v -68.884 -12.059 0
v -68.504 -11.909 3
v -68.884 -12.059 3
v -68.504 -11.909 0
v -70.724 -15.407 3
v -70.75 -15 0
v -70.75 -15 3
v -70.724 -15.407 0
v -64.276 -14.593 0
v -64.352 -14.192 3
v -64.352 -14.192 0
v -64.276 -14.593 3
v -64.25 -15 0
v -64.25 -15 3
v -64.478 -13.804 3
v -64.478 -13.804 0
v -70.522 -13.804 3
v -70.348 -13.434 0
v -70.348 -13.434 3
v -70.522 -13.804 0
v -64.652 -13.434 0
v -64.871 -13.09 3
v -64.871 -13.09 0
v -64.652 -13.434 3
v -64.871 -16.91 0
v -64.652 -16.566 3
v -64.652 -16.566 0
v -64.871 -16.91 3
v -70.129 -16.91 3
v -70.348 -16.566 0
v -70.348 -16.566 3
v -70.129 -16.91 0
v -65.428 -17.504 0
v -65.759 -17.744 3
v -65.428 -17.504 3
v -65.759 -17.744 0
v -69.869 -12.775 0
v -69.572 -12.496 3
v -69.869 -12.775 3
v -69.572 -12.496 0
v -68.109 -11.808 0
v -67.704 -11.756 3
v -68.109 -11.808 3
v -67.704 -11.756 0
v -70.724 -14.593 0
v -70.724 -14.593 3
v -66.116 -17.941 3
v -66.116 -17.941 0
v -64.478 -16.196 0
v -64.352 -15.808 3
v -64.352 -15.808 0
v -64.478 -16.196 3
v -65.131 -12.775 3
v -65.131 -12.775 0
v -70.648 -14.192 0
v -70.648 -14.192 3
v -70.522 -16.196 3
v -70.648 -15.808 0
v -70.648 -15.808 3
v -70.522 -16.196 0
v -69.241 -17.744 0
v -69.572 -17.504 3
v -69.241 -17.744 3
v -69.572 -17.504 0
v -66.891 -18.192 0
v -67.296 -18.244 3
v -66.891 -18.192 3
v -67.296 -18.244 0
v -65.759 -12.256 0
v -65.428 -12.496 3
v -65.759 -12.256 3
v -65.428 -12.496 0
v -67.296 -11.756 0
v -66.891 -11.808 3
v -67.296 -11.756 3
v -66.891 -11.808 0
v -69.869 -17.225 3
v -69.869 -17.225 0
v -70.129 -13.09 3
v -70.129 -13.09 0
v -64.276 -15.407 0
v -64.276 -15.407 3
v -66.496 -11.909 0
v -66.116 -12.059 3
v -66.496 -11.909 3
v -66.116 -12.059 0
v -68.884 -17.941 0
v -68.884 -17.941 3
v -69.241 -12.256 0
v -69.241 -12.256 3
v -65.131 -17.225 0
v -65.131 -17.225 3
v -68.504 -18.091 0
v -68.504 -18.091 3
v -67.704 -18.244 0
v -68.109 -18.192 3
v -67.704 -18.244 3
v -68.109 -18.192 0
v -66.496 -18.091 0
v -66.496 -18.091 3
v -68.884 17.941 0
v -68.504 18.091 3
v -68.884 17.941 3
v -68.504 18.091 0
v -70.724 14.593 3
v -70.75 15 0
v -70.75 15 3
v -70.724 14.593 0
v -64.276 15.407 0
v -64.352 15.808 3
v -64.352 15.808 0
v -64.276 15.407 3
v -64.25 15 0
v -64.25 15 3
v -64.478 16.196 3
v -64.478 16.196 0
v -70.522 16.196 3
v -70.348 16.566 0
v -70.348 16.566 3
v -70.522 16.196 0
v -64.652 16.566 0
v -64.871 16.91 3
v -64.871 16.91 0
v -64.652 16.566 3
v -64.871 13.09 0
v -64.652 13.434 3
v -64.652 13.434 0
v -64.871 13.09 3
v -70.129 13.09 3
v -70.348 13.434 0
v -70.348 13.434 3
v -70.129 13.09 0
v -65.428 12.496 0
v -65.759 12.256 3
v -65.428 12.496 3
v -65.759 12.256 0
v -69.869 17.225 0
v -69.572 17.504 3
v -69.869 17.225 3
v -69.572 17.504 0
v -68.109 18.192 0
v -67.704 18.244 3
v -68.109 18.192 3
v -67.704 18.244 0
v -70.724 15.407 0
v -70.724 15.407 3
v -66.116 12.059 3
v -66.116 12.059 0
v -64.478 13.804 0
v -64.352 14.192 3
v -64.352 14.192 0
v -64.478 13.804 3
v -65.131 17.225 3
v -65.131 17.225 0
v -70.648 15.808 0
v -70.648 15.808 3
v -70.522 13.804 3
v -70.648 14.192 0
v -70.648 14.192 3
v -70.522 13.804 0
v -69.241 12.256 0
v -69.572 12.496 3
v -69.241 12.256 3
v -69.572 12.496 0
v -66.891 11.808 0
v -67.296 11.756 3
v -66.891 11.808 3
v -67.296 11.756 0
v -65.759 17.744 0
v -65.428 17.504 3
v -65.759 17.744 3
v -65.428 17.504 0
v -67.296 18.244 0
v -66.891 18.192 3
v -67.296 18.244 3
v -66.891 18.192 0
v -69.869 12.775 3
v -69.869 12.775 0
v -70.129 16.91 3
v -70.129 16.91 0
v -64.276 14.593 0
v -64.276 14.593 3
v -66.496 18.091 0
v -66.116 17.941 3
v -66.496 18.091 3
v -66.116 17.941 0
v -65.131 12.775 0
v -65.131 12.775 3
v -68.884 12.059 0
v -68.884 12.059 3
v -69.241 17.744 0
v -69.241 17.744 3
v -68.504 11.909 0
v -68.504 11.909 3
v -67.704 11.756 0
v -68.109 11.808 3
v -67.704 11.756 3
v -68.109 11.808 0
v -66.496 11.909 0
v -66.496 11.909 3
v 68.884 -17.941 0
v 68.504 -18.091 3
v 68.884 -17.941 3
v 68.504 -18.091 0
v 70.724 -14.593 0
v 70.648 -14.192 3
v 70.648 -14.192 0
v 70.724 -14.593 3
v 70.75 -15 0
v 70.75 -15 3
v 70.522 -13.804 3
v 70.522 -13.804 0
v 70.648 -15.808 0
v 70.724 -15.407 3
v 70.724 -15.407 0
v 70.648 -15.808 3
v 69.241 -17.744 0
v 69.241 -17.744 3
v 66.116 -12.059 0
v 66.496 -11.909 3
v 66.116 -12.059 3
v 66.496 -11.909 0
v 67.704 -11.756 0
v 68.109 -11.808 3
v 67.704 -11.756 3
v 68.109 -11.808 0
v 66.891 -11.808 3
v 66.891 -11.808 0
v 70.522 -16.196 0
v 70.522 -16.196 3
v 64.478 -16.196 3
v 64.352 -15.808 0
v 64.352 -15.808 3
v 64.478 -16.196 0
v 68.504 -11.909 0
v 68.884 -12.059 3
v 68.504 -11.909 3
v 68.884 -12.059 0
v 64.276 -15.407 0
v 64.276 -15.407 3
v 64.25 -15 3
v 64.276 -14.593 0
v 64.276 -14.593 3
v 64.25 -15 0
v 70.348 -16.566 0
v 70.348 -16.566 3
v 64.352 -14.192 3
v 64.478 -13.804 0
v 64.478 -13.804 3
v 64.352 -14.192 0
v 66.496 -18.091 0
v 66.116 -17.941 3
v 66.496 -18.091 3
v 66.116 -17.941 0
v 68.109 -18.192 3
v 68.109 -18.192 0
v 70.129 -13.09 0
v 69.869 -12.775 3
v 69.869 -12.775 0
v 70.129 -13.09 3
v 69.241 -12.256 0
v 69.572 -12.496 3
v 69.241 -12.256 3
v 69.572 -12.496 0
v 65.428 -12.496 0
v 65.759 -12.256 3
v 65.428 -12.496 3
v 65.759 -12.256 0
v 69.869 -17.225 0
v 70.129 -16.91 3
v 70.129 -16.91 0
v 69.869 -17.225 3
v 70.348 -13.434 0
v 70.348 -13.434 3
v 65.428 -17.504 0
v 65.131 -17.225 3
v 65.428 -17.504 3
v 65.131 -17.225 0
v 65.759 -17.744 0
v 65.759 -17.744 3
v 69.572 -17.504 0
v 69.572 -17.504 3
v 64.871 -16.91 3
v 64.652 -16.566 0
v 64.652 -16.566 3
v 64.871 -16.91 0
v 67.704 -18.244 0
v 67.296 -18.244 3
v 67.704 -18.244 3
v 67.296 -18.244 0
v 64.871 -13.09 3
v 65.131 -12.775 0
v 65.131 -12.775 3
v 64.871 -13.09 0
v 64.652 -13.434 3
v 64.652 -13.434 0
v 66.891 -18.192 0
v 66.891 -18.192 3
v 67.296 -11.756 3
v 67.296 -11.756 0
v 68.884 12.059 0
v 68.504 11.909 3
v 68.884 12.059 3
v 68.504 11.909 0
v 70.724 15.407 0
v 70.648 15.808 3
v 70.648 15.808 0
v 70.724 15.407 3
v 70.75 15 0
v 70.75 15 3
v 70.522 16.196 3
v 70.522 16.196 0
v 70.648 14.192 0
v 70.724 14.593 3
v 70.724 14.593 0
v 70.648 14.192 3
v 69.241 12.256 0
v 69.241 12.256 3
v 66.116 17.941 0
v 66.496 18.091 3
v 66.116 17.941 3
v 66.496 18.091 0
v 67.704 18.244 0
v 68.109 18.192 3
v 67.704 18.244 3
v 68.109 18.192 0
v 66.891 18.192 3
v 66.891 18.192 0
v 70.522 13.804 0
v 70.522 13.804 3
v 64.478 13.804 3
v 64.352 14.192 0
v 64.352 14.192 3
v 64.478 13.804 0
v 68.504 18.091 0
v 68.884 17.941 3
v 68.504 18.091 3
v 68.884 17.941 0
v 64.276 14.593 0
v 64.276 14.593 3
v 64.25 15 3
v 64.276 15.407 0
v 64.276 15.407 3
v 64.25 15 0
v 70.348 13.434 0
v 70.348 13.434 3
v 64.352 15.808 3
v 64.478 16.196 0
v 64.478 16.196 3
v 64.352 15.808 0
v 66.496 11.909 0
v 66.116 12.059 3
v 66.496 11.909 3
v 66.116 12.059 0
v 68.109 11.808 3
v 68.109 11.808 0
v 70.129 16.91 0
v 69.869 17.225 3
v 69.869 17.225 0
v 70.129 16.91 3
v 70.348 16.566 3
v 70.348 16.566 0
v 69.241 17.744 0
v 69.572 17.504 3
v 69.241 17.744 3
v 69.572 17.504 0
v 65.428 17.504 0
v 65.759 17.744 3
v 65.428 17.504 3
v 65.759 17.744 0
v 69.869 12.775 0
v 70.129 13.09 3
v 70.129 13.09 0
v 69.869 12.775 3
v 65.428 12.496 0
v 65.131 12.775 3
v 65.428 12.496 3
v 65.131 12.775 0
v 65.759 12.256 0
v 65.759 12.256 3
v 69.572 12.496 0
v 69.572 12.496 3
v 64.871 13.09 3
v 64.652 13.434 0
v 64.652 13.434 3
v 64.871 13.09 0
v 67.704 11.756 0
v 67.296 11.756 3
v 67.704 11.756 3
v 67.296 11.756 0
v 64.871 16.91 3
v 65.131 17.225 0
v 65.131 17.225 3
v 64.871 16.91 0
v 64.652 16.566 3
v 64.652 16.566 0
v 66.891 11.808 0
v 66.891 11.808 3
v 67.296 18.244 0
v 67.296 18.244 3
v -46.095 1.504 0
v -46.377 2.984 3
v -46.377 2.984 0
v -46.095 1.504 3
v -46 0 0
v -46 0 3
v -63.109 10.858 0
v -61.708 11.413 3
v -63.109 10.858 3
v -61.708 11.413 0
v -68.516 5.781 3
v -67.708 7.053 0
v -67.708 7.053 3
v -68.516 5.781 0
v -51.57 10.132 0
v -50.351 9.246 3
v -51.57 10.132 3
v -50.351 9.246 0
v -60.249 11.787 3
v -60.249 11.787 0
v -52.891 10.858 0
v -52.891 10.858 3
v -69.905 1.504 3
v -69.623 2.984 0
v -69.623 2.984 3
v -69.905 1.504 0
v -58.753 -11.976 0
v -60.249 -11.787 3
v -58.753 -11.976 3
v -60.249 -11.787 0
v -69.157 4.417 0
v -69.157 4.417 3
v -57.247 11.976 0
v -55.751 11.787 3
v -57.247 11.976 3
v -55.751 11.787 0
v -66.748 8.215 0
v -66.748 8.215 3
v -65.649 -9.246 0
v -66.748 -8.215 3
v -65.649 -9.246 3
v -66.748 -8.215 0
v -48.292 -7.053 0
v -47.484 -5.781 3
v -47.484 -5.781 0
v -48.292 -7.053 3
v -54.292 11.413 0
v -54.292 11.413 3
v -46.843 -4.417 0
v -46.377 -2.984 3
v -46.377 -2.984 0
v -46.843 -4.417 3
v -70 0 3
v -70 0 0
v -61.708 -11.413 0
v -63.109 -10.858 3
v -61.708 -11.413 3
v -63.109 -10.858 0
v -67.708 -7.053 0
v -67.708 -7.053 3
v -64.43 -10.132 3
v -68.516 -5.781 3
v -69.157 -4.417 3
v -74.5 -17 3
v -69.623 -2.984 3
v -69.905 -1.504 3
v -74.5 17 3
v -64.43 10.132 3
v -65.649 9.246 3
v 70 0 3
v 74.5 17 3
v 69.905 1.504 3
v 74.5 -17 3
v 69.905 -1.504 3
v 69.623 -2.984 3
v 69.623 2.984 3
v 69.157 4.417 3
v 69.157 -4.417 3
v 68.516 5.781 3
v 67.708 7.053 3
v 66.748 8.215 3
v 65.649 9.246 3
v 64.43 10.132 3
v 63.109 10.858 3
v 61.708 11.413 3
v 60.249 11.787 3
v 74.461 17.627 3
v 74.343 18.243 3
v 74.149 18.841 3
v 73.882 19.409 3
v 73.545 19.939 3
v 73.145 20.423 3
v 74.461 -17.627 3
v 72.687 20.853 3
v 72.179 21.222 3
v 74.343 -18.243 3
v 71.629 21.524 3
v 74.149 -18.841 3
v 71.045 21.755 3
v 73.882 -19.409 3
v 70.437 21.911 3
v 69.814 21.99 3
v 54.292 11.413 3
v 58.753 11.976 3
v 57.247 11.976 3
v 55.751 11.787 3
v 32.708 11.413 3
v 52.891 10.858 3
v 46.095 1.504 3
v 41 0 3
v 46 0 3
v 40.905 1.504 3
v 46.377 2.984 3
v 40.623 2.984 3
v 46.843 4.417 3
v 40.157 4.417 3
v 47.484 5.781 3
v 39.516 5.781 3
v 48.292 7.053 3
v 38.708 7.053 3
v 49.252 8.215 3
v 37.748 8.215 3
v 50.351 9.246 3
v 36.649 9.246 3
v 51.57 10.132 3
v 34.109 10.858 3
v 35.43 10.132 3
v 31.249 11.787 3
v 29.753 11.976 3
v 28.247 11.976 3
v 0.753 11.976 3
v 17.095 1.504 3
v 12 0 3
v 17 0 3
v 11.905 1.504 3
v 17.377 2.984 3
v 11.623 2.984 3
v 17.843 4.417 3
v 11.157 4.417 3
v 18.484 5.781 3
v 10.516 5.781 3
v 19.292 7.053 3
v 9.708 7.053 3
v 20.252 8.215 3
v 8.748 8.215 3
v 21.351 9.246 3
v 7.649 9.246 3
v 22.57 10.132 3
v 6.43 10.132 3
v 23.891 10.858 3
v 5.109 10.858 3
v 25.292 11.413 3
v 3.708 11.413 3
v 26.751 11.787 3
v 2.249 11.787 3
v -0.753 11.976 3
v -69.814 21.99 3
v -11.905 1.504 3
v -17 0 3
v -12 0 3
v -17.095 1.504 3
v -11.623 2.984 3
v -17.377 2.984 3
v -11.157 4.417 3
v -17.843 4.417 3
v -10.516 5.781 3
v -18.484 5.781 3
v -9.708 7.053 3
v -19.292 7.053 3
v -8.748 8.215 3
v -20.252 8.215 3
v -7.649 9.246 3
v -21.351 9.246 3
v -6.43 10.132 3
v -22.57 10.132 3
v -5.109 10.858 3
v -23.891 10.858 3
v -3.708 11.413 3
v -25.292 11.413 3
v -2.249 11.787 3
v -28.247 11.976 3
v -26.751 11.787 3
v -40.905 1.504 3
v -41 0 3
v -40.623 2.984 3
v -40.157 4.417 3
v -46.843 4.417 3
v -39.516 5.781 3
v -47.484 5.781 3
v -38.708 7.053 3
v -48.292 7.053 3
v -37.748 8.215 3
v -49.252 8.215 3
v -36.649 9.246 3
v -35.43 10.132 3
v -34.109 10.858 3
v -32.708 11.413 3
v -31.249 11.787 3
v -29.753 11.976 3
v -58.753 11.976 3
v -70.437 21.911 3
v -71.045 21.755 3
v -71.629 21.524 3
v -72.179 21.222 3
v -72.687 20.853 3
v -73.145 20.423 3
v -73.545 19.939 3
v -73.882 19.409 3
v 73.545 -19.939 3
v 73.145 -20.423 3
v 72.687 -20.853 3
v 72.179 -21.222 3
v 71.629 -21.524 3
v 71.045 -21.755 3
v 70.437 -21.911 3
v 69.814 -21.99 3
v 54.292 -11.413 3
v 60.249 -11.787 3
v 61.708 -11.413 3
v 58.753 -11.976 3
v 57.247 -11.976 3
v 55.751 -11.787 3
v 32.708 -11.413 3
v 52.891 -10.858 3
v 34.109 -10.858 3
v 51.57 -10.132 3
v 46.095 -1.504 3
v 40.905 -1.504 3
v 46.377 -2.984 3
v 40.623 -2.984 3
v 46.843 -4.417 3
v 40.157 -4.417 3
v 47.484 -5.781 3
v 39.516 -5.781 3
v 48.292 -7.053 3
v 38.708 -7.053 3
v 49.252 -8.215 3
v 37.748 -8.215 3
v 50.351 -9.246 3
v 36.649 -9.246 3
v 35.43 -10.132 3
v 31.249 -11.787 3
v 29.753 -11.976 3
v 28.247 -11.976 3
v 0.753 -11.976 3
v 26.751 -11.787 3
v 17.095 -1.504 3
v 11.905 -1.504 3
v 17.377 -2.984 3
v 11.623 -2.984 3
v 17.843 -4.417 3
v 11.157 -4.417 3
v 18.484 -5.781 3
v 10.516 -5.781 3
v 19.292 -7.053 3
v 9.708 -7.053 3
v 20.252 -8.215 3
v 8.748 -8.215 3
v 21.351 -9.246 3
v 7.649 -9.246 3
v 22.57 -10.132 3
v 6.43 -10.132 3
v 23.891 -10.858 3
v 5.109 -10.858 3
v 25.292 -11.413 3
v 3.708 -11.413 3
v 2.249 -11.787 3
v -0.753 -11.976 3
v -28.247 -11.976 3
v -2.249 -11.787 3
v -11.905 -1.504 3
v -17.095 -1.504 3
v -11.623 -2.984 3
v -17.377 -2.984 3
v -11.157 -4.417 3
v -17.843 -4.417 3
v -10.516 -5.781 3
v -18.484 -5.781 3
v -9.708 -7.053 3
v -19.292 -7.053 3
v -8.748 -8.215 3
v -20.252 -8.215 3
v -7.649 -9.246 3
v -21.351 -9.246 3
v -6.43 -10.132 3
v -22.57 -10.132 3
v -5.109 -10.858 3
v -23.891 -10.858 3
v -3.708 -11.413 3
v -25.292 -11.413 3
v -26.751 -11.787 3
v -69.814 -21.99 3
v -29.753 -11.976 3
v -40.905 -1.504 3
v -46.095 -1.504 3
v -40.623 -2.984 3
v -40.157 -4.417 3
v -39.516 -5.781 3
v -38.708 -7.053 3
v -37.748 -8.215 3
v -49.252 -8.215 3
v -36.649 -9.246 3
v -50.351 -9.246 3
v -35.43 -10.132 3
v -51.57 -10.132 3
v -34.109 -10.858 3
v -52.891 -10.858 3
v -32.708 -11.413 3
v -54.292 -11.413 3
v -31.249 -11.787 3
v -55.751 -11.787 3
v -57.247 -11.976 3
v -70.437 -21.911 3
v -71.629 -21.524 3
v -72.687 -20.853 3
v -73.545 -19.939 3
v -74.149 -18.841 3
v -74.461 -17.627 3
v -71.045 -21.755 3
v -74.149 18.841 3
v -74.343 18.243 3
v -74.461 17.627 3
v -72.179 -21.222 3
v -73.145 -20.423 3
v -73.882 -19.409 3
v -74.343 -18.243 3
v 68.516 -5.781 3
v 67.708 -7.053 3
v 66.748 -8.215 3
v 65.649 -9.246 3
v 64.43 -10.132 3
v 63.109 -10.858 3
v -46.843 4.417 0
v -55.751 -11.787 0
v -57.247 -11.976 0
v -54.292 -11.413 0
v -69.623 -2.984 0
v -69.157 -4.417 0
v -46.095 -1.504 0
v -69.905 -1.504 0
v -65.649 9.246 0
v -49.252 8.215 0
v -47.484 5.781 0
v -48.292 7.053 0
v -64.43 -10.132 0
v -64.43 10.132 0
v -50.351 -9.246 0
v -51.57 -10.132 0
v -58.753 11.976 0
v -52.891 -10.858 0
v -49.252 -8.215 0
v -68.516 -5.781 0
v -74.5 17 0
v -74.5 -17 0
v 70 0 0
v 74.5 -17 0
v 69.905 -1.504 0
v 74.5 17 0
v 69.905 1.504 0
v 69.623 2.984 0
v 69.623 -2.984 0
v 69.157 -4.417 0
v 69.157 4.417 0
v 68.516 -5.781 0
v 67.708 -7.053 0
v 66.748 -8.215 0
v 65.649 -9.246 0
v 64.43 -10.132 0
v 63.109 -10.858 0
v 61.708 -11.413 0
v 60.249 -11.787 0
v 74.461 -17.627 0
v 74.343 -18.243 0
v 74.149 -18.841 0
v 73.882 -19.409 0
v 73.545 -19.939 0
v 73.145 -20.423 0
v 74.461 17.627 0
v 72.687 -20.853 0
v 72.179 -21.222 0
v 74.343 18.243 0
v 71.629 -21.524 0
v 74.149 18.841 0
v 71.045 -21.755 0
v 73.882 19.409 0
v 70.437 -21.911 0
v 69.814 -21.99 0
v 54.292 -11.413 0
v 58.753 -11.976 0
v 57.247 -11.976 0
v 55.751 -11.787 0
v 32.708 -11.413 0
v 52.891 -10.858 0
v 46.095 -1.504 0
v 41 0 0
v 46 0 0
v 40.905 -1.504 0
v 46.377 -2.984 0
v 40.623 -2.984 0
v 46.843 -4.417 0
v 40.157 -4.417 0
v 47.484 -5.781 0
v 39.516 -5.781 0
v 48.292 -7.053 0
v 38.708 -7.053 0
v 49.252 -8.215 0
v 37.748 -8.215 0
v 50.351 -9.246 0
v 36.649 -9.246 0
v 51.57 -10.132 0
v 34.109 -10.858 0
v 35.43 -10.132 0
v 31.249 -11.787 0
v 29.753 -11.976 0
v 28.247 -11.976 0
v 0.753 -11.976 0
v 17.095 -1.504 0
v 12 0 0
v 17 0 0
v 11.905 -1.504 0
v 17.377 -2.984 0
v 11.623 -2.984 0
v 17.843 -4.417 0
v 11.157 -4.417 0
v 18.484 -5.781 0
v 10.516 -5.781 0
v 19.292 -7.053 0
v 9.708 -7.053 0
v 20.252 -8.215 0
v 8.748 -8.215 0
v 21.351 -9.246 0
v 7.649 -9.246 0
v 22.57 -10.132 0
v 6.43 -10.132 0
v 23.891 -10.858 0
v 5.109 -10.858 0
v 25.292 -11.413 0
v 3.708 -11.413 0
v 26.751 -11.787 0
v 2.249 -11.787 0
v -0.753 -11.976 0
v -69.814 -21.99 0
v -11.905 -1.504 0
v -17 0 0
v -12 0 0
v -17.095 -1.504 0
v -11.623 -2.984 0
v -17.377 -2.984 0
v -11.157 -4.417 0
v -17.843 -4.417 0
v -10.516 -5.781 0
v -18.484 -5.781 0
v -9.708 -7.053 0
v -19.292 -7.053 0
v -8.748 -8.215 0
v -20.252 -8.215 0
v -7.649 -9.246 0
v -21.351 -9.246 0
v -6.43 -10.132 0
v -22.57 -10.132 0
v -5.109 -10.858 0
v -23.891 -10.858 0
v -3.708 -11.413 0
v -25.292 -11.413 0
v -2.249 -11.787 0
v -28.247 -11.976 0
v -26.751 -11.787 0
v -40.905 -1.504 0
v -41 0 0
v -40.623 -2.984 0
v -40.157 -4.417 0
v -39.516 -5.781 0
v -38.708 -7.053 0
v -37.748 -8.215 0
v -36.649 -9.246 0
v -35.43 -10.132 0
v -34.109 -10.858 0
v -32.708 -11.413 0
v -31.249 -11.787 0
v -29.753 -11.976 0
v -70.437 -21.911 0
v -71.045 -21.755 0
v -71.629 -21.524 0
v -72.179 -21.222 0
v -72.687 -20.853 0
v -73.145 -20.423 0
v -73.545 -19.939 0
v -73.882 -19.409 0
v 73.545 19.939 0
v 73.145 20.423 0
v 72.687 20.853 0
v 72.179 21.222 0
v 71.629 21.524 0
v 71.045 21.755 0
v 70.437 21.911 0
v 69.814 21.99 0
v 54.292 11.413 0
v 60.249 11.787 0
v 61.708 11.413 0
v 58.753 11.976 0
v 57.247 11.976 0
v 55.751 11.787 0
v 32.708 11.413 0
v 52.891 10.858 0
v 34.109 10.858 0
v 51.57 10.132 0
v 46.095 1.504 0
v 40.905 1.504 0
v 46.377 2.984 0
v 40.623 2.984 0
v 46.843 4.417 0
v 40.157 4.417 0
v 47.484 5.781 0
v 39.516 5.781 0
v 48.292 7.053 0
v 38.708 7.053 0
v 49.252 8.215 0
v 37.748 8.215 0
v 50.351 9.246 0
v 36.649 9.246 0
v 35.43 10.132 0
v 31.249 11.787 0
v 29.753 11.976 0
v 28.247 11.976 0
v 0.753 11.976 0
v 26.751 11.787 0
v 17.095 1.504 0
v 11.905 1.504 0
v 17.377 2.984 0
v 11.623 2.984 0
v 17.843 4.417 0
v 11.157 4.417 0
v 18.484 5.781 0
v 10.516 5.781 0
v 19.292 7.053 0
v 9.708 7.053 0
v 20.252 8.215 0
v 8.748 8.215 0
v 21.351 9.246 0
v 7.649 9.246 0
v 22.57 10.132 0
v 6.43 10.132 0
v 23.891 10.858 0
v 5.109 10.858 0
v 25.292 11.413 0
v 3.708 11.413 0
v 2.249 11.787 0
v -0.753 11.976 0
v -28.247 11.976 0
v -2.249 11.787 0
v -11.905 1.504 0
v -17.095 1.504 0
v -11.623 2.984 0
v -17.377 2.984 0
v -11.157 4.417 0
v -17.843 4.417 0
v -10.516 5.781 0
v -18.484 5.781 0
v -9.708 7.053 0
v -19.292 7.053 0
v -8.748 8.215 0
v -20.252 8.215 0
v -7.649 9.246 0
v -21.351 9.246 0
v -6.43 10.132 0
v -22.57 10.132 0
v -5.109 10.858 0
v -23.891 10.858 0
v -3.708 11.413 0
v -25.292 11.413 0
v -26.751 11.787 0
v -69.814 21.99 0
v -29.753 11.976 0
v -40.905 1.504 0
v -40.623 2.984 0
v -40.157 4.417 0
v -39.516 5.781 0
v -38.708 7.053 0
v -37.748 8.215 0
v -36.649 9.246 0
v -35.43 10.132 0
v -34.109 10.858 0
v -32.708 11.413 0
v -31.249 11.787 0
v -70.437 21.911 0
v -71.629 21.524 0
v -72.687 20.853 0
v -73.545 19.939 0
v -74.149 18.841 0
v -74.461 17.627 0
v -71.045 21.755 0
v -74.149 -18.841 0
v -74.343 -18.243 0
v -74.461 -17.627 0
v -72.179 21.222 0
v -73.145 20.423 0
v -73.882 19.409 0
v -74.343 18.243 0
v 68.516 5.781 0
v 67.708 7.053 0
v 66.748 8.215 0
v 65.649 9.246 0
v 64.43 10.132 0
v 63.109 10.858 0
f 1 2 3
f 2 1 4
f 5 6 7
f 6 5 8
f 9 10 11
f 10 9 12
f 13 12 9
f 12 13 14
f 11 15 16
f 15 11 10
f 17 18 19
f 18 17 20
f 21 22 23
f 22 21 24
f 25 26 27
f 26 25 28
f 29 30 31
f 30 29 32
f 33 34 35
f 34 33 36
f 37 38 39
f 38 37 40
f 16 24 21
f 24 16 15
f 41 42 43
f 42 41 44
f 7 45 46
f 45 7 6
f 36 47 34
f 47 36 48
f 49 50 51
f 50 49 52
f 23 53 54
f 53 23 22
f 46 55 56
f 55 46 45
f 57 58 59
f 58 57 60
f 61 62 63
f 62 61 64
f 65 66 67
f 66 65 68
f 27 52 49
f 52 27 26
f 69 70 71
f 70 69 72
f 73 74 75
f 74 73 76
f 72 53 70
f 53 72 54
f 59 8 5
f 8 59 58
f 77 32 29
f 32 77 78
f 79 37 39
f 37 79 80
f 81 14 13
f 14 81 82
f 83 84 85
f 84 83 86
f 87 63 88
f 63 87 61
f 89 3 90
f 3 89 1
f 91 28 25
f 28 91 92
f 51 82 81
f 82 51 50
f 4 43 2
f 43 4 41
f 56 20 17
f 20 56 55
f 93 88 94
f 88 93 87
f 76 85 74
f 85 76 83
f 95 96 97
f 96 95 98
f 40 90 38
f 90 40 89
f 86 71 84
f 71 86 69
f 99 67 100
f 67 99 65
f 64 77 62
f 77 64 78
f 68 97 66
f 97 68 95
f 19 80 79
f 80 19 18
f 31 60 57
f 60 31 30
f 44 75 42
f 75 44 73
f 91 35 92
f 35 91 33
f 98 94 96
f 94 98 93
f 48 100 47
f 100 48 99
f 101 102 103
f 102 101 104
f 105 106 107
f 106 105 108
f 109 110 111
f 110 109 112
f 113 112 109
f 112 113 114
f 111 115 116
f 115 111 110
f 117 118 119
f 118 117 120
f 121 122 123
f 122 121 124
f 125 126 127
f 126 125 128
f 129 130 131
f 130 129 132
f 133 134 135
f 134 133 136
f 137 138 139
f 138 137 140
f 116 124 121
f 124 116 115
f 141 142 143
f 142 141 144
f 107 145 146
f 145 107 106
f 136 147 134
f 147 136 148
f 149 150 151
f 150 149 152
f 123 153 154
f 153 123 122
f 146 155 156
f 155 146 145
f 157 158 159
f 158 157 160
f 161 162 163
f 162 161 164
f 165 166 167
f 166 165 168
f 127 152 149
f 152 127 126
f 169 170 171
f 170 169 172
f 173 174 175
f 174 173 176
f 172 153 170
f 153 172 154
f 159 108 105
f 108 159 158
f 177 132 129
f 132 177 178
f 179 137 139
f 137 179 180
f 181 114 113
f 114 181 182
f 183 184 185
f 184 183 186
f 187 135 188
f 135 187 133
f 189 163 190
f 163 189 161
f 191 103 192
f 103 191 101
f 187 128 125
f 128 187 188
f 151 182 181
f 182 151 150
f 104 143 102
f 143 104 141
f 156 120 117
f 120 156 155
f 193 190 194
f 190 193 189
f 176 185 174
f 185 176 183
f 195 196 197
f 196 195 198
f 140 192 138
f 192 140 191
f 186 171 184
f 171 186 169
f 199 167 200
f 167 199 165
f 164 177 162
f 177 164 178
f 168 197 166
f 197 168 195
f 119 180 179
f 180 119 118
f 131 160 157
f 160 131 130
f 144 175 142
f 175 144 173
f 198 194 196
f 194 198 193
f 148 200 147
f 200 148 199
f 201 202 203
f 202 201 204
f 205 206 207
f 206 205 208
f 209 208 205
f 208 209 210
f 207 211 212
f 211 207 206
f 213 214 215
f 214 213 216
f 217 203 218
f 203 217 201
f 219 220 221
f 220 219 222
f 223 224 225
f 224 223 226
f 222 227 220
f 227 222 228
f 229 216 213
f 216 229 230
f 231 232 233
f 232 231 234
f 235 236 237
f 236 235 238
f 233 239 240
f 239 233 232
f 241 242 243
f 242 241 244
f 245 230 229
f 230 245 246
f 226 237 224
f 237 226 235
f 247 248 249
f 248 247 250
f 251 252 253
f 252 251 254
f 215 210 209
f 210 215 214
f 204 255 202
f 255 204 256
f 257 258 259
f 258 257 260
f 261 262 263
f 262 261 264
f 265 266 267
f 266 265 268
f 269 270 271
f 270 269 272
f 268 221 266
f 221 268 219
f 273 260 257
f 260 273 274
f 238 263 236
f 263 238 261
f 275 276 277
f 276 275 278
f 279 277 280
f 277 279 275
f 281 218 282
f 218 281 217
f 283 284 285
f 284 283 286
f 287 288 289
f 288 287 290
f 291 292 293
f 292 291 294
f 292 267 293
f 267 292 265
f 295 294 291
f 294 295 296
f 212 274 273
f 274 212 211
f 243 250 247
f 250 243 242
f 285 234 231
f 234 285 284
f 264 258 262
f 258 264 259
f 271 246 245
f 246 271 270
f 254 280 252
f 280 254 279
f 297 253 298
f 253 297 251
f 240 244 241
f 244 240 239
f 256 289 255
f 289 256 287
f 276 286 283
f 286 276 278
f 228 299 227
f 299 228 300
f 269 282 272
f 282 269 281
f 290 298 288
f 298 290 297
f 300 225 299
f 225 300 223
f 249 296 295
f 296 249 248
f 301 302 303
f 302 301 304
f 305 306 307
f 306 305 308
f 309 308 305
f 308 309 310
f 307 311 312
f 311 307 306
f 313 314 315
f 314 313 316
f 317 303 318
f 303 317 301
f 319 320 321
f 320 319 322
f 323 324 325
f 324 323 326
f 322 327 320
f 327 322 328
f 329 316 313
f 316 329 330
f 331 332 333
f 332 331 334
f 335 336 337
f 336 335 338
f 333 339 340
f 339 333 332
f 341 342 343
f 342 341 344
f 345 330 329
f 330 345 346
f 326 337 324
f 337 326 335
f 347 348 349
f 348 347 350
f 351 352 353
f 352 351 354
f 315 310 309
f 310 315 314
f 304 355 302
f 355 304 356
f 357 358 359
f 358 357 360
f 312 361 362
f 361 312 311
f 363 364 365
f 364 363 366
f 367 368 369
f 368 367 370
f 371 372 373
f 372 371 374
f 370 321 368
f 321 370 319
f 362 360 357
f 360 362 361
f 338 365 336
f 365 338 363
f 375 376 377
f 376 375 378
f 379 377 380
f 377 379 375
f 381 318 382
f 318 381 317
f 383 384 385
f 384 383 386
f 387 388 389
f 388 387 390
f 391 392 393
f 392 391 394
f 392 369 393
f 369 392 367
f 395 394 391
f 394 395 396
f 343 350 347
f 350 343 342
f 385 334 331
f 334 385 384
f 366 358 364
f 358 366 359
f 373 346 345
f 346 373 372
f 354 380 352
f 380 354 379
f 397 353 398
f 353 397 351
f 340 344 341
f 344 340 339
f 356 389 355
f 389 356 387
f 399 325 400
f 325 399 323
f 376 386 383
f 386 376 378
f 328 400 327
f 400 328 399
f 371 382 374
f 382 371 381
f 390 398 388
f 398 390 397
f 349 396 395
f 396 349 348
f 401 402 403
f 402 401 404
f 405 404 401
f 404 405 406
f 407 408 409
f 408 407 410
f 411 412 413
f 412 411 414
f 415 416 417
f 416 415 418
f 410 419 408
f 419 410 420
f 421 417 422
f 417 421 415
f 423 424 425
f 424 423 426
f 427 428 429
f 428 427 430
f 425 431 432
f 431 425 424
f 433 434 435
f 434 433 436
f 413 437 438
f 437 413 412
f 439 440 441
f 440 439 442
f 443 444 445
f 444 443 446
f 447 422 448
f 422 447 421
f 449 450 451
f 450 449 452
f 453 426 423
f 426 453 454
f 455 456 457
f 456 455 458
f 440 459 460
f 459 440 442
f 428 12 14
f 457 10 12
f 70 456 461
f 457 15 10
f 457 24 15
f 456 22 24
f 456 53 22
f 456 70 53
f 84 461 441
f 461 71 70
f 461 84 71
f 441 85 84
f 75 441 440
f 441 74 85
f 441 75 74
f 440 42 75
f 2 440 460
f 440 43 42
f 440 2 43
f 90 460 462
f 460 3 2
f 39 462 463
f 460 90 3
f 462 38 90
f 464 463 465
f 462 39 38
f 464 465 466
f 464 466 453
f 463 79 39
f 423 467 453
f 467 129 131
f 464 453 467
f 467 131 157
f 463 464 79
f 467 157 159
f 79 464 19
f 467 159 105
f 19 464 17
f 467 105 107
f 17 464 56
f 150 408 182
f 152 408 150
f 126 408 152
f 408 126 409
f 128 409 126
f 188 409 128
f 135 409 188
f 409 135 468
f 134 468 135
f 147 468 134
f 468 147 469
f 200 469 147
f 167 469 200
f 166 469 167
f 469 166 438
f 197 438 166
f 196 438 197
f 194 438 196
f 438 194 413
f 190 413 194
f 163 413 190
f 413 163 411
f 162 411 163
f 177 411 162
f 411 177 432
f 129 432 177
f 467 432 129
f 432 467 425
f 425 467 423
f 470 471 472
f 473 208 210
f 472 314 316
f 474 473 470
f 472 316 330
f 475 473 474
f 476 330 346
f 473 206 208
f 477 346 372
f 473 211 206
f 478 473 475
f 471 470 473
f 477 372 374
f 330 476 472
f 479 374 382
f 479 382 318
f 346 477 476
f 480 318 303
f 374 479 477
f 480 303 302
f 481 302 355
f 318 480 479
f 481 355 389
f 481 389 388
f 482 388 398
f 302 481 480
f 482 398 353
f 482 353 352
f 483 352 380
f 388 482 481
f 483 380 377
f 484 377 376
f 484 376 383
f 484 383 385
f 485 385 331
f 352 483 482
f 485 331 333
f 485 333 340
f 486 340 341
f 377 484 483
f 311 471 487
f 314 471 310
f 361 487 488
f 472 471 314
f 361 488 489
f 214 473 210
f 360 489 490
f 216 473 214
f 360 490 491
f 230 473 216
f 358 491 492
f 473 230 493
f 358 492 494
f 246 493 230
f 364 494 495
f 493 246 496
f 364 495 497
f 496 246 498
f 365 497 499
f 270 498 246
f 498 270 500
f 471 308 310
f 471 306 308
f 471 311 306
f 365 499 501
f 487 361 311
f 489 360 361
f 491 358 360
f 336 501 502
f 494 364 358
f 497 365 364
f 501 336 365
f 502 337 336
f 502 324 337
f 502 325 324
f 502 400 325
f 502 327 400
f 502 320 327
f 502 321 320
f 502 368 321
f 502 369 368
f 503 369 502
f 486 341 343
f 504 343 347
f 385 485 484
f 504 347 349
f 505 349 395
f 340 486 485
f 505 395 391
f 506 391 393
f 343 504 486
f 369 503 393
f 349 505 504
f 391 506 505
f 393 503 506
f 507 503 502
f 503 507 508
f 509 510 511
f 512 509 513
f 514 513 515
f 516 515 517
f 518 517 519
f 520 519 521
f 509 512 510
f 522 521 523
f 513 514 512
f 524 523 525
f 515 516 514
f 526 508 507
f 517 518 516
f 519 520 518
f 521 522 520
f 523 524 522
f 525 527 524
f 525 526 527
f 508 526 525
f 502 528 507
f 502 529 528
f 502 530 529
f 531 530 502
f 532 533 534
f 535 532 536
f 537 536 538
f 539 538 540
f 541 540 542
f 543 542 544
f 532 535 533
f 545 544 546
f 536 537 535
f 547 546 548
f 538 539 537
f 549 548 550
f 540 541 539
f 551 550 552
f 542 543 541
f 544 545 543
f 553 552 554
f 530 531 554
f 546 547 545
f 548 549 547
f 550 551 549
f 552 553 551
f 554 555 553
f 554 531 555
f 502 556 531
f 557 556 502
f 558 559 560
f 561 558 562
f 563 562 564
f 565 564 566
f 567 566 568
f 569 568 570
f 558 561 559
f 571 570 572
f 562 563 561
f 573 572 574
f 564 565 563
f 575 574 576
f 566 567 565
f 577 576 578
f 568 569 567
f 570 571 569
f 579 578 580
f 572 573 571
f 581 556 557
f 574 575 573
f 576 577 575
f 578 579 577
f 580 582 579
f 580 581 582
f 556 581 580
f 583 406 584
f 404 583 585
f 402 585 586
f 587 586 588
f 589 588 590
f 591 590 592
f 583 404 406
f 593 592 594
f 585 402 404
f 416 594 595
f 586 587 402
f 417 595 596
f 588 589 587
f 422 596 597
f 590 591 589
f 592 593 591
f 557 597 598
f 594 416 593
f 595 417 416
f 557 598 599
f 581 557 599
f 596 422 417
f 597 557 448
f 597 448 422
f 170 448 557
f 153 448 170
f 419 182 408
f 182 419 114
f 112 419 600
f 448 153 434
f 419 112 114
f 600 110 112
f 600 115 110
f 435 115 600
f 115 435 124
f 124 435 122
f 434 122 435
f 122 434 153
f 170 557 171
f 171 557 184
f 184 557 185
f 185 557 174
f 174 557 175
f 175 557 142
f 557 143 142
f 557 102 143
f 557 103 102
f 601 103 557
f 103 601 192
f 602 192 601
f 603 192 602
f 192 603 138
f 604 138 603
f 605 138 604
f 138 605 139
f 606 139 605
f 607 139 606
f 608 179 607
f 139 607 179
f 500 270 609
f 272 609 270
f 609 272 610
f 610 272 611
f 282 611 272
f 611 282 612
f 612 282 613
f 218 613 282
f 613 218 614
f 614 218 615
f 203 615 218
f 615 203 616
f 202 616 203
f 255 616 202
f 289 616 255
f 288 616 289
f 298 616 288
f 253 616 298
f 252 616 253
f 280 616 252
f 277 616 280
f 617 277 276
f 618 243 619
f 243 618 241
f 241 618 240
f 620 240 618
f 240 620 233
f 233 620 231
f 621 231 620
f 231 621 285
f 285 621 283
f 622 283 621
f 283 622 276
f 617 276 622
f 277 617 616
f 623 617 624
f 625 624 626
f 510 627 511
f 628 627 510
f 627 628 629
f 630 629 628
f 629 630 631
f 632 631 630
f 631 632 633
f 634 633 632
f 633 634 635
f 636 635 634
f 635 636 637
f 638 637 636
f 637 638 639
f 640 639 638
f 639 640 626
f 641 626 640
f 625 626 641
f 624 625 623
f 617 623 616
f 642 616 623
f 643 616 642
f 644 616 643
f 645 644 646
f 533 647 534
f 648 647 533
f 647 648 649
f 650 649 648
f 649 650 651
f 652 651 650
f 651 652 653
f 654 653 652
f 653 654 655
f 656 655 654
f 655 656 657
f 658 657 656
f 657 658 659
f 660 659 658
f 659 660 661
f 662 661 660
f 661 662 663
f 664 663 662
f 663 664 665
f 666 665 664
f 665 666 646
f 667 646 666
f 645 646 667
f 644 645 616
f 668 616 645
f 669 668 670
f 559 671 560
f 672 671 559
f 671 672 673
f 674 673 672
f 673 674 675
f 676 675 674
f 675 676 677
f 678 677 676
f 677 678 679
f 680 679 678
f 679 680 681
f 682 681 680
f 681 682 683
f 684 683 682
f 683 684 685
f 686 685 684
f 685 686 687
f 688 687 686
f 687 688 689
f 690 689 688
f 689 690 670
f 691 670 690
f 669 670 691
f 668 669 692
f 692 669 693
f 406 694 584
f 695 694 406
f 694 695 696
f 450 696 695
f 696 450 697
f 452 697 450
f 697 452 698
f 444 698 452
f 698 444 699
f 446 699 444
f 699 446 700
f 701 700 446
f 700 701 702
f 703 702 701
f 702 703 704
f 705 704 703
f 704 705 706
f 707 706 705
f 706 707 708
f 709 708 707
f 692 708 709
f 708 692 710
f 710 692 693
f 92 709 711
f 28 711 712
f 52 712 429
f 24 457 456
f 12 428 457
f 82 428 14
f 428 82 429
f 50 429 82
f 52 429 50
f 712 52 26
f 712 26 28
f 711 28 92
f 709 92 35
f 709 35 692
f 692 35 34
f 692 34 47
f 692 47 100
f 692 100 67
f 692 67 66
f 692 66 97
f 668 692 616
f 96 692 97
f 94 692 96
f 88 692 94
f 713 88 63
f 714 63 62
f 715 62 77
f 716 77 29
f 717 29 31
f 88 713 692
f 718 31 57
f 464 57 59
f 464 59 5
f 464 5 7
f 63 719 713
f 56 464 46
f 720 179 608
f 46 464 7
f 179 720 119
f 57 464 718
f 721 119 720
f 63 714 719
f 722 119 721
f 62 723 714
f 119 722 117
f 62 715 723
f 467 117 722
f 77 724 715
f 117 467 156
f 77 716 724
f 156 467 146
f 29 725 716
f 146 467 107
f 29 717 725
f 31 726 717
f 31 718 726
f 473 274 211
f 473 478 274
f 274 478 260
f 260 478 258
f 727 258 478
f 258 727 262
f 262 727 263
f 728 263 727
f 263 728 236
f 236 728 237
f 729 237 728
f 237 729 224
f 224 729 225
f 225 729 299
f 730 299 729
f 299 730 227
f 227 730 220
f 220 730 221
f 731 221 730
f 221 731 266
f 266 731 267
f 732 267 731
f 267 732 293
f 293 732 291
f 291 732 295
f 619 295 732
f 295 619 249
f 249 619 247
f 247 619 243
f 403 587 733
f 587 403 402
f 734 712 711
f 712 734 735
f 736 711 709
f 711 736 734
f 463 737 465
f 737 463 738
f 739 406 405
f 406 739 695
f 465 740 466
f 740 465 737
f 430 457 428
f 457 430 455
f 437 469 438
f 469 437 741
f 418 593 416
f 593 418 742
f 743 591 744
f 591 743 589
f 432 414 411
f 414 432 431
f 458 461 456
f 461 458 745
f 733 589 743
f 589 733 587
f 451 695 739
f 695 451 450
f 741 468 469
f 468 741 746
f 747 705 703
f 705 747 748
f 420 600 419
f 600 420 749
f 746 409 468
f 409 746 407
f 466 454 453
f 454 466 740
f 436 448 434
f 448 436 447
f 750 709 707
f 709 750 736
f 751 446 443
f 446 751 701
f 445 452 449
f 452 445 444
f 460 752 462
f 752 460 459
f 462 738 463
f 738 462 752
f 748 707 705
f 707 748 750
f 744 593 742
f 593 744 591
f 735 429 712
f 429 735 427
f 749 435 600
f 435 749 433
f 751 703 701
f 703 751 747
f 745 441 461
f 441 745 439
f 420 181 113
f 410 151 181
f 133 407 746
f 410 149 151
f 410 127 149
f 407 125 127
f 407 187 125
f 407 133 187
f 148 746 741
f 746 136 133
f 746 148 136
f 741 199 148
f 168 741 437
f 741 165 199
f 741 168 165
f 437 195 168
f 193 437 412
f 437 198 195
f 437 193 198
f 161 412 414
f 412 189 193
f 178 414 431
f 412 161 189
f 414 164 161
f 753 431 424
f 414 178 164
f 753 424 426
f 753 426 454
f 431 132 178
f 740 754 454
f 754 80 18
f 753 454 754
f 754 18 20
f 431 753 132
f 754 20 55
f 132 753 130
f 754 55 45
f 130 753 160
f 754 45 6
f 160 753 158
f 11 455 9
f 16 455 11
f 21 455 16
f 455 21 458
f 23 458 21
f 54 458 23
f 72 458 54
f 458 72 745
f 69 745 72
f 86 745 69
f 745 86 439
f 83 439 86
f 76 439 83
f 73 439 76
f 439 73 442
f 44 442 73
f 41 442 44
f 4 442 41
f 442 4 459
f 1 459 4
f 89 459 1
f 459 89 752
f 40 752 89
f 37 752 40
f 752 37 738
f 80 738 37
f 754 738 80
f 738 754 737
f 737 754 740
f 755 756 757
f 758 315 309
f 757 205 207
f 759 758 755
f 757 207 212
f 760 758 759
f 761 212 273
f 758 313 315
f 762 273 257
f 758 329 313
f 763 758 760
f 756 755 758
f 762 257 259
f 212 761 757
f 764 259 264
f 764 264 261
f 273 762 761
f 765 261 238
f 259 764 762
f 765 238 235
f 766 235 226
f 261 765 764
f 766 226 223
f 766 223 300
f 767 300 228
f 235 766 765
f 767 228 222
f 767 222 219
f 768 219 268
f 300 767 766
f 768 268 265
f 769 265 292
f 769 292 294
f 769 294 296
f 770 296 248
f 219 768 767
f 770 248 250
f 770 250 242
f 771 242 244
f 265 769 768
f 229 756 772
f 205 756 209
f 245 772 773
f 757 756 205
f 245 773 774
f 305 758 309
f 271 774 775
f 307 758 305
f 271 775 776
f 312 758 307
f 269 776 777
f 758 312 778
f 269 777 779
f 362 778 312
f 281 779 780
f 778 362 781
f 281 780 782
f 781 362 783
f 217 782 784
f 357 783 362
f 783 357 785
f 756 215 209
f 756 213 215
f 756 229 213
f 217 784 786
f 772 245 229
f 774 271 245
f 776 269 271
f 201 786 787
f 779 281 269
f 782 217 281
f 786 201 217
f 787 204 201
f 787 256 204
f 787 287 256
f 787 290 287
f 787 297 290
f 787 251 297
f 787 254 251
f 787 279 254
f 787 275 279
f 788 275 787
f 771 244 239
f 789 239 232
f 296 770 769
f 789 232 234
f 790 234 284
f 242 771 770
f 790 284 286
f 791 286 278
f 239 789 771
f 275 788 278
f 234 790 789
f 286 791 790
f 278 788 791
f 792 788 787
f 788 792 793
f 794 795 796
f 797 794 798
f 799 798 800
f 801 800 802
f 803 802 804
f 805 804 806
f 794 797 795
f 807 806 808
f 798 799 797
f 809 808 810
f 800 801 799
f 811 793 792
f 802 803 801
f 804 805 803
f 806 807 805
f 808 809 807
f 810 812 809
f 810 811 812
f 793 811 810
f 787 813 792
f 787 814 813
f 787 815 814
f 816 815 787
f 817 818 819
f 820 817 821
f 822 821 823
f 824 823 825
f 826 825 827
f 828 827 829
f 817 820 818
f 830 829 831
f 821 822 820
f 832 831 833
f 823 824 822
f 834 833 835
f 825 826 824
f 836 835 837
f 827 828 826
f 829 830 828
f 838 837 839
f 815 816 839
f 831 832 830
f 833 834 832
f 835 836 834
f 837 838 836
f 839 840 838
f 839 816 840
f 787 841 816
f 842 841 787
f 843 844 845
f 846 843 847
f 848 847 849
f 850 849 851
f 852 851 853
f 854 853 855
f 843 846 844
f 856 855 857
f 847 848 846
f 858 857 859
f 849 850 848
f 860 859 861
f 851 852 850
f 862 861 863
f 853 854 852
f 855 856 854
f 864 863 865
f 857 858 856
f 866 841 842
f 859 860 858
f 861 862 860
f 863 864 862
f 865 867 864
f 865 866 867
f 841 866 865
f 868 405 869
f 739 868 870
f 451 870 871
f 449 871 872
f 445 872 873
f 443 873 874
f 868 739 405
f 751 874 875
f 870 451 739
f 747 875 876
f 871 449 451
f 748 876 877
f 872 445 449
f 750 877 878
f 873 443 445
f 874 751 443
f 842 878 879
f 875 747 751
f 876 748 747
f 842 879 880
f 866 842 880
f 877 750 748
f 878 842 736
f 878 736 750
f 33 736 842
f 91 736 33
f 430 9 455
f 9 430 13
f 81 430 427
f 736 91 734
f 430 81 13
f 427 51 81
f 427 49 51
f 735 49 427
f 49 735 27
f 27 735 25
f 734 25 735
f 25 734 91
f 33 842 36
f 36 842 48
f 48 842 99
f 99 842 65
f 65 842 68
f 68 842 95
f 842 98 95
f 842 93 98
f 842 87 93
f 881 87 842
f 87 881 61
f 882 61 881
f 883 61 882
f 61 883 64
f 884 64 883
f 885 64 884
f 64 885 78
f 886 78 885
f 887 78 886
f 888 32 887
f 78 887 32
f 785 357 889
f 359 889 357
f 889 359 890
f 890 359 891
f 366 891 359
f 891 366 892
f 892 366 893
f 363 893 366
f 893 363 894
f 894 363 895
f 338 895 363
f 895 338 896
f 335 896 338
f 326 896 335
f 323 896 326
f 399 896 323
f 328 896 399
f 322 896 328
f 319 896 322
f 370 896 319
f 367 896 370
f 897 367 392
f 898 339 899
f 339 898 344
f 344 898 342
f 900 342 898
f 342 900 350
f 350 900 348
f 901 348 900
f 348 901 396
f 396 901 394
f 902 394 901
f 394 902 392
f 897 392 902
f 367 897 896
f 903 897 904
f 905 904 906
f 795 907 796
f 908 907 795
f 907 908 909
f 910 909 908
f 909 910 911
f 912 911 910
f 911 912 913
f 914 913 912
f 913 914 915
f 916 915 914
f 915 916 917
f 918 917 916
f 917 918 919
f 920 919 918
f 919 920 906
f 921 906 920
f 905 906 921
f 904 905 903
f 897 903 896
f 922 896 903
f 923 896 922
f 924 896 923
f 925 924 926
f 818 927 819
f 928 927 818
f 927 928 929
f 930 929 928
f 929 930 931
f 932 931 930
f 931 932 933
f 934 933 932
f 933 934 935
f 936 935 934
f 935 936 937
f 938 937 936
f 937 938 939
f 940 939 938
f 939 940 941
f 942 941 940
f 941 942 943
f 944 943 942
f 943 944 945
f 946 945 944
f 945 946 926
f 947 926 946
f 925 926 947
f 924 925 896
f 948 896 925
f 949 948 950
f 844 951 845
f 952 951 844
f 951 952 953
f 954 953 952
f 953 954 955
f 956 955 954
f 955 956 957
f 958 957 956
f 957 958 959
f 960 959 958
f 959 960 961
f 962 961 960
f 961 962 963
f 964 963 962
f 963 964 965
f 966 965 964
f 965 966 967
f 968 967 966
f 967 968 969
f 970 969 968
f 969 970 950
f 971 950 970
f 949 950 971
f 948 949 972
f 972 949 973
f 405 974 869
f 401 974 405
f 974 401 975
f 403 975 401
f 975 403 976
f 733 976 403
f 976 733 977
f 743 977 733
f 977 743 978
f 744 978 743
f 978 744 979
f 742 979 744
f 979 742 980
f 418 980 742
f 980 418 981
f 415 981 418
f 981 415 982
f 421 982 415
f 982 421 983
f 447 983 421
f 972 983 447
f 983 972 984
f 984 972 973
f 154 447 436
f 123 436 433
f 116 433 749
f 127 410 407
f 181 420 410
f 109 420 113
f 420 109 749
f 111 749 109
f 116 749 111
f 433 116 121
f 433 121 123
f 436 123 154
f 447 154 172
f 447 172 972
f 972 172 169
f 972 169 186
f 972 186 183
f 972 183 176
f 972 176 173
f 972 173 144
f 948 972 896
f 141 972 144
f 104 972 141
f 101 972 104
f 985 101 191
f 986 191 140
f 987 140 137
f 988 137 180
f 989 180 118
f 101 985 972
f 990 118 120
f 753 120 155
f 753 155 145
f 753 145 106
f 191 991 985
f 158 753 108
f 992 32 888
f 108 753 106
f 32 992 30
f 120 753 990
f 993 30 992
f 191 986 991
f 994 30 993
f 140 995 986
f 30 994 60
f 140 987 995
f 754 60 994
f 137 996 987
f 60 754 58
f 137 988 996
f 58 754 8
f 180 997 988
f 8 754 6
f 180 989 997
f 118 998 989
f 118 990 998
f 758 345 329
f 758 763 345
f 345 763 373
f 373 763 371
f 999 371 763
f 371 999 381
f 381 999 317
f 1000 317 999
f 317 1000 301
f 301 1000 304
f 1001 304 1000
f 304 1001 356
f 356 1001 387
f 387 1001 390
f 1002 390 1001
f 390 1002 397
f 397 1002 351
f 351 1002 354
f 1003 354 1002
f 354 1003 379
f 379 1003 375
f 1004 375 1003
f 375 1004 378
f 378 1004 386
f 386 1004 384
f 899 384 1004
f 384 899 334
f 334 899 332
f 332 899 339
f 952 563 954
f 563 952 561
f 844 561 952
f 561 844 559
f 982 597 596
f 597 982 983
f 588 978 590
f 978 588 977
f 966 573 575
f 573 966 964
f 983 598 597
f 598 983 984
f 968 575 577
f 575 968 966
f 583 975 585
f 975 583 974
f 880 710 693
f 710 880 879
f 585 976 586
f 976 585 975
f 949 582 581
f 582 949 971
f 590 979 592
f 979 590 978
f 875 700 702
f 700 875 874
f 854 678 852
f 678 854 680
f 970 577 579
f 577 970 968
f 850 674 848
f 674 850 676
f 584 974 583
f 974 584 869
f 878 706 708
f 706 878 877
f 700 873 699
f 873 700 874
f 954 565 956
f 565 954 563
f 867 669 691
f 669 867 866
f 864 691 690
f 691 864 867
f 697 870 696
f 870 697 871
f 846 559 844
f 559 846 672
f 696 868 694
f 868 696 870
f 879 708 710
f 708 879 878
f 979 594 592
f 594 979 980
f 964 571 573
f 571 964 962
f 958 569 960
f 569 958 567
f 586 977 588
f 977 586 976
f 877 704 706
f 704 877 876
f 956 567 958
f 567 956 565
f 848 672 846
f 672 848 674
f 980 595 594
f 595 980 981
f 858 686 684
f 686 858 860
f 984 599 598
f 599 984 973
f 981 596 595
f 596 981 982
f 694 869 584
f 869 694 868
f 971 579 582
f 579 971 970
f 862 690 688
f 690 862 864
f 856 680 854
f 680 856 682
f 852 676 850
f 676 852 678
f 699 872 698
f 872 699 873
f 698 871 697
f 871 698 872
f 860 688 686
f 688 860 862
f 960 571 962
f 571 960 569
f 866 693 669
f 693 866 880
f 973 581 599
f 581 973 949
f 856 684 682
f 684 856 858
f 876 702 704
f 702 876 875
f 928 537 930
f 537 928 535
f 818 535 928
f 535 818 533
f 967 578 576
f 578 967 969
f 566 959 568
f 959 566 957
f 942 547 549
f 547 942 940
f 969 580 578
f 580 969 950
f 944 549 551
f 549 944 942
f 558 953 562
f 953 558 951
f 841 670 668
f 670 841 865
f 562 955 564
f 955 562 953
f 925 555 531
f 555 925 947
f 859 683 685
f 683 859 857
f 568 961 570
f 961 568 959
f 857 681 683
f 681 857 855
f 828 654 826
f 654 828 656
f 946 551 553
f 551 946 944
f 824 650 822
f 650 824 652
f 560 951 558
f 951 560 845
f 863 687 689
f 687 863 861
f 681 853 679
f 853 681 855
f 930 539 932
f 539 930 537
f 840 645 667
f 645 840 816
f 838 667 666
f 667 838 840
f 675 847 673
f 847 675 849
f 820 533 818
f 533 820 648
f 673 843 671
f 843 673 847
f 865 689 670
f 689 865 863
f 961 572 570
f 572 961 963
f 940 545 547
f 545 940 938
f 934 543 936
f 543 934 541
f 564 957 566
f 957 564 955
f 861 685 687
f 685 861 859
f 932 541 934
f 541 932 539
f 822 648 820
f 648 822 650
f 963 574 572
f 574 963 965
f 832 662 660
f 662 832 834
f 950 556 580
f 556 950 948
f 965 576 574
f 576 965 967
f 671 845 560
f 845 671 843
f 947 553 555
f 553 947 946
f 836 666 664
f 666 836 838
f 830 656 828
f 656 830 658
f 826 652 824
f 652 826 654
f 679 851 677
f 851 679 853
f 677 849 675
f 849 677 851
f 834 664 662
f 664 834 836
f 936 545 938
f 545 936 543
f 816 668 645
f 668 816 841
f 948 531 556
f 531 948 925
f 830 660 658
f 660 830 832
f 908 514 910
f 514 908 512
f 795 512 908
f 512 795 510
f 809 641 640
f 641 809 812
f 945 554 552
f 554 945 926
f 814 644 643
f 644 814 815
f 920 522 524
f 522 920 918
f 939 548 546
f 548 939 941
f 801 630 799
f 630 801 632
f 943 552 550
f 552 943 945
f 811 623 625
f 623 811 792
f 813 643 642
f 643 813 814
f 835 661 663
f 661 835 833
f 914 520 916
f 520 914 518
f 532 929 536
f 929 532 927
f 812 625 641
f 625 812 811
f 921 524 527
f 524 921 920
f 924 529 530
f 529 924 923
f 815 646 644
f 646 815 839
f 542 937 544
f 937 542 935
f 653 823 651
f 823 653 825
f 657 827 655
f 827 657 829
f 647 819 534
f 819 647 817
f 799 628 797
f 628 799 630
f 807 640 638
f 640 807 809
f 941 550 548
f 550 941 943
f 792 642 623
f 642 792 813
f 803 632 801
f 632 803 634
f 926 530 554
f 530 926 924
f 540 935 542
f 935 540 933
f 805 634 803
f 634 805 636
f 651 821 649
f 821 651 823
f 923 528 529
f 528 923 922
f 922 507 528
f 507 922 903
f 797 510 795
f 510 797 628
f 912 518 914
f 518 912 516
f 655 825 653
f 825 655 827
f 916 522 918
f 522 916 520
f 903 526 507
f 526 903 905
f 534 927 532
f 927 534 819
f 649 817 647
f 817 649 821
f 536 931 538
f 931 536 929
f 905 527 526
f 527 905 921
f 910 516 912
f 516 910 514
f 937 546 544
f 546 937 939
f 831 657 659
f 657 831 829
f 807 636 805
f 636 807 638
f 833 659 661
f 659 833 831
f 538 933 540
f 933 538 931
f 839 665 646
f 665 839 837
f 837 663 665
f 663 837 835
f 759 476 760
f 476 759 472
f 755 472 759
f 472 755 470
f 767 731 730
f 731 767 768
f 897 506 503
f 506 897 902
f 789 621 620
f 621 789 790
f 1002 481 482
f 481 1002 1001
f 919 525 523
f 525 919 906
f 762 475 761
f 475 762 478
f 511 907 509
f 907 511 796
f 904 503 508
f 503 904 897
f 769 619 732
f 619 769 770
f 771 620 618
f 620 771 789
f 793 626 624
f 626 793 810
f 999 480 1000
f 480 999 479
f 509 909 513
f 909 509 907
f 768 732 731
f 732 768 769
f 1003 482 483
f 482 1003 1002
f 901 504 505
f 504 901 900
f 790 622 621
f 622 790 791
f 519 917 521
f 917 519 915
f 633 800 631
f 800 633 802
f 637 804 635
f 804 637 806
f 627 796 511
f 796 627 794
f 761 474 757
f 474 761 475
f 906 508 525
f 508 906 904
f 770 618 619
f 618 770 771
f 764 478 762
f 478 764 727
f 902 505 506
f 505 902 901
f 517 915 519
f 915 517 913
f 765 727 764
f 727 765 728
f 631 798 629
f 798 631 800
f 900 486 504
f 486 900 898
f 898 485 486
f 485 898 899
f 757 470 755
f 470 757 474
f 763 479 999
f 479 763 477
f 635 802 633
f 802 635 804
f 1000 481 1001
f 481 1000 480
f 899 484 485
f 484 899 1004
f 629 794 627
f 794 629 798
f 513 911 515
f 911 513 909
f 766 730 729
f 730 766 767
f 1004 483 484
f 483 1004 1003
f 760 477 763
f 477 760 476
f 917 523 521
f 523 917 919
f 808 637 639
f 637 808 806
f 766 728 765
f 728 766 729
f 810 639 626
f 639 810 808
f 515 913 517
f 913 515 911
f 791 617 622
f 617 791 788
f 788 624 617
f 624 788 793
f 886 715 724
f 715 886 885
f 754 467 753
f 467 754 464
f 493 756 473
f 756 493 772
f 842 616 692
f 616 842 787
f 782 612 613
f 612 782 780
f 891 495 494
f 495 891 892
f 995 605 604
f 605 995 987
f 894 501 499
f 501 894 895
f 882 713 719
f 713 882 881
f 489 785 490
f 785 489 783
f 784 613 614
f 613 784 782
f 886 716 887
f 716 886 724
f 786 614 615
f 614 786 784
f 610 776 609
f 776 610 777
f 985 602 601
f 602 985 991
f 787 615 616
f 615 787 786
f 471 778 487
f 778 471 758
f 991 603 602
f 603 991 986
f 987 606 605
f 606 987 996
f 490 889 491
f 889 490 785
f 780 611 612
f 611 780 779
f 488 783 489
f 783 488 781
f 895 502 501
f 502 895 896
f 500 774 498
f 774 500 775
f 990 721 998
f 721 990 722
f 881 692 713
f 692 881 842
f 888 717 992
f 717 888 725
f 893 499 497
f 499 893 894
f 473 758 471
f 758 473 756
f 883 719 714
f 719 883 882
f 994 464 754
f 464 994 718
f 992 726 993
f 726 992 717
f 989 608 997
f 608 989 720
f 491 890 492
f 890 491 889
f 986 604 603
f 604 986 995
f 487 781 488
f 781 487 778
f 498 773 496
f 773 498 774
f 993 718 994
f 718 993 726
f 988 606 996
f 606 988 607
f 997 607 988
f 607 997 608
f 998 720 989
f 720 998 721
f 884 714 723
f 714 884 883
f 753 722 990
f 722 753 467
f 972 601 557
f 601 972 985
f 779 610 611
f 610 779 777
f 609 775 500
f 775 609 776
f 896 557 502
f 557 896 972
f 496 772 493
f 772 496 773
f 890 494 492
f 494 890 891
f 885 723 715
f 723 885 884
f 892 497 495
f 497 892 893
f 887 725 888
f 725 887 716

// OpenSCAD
$fn = 50;

difference() {
	union() {
		hull() {
			translate(v = [-69.5, 17.0, 0]) {
				cylinder(h = 3, r = 5);
			}
			translate(v = [69.5, 17.0, 0]) {
				cylinder(h = 3, r = 5);
			}
			translate(v = [-69.5, -17.0, 0]) {
				cylinder(h = 3, r = 5);
			}
			translate(v = [69.5, -17.0, 0]) {
				cylinder(h = 3, r = 5);
			}
		}
	}
	union() {
		translate(v = [-67.5, -15.0, -100.0]) {
			cylinder(h = 200, r = 3.25);
		}
		translate(v = [-67.5, 15.0, -100.0]) {
			cylinder(h = 200, r = 3.25);
		}
		translate(v = [67.5, -15.0, -100.0]) {
			cylinder(h = 200, r = 3.25);
		}
		translate(v = [67.5, 15.0, -100.0]) {
			cylinder(h = 200, r = 3.25);
		}
		translate(v = [-67.5, -15.0, -100.0]) {
			cylinder(h = 200, r = 1.8);
		}
		translate(v = [-67.5, 15.0, -100.0]) {
			cylinder(h = 200, r = 1.8);
		}
		translate(v = [67.5, -15.0, -100.0]) {
			cylinder(h = 200, r = 1.8);
		}
		translate(v = [67.5, 15.0, -100.0]) {
			cylinder(h = 200, r = 1.8);
		}
		translate(v = [-58.0, 0, 0.0]) {
			cylinder(h = 3, r = 12.0);
		}
		translate(v = [-29.0, 0, 0.0]) {
			cylinder(h = 3, r = 12.0);
		}
		cylinder(h = 3, r = 12.0);
		translate(v = [29.0, 0, 0.0]) {
			cylinder(h = 3, r = 12.0);
		}
		translate(v = [58.0, 0, 0.0]) {
			cylinder(h = 3, r = 12.0);
		}
	}
}
